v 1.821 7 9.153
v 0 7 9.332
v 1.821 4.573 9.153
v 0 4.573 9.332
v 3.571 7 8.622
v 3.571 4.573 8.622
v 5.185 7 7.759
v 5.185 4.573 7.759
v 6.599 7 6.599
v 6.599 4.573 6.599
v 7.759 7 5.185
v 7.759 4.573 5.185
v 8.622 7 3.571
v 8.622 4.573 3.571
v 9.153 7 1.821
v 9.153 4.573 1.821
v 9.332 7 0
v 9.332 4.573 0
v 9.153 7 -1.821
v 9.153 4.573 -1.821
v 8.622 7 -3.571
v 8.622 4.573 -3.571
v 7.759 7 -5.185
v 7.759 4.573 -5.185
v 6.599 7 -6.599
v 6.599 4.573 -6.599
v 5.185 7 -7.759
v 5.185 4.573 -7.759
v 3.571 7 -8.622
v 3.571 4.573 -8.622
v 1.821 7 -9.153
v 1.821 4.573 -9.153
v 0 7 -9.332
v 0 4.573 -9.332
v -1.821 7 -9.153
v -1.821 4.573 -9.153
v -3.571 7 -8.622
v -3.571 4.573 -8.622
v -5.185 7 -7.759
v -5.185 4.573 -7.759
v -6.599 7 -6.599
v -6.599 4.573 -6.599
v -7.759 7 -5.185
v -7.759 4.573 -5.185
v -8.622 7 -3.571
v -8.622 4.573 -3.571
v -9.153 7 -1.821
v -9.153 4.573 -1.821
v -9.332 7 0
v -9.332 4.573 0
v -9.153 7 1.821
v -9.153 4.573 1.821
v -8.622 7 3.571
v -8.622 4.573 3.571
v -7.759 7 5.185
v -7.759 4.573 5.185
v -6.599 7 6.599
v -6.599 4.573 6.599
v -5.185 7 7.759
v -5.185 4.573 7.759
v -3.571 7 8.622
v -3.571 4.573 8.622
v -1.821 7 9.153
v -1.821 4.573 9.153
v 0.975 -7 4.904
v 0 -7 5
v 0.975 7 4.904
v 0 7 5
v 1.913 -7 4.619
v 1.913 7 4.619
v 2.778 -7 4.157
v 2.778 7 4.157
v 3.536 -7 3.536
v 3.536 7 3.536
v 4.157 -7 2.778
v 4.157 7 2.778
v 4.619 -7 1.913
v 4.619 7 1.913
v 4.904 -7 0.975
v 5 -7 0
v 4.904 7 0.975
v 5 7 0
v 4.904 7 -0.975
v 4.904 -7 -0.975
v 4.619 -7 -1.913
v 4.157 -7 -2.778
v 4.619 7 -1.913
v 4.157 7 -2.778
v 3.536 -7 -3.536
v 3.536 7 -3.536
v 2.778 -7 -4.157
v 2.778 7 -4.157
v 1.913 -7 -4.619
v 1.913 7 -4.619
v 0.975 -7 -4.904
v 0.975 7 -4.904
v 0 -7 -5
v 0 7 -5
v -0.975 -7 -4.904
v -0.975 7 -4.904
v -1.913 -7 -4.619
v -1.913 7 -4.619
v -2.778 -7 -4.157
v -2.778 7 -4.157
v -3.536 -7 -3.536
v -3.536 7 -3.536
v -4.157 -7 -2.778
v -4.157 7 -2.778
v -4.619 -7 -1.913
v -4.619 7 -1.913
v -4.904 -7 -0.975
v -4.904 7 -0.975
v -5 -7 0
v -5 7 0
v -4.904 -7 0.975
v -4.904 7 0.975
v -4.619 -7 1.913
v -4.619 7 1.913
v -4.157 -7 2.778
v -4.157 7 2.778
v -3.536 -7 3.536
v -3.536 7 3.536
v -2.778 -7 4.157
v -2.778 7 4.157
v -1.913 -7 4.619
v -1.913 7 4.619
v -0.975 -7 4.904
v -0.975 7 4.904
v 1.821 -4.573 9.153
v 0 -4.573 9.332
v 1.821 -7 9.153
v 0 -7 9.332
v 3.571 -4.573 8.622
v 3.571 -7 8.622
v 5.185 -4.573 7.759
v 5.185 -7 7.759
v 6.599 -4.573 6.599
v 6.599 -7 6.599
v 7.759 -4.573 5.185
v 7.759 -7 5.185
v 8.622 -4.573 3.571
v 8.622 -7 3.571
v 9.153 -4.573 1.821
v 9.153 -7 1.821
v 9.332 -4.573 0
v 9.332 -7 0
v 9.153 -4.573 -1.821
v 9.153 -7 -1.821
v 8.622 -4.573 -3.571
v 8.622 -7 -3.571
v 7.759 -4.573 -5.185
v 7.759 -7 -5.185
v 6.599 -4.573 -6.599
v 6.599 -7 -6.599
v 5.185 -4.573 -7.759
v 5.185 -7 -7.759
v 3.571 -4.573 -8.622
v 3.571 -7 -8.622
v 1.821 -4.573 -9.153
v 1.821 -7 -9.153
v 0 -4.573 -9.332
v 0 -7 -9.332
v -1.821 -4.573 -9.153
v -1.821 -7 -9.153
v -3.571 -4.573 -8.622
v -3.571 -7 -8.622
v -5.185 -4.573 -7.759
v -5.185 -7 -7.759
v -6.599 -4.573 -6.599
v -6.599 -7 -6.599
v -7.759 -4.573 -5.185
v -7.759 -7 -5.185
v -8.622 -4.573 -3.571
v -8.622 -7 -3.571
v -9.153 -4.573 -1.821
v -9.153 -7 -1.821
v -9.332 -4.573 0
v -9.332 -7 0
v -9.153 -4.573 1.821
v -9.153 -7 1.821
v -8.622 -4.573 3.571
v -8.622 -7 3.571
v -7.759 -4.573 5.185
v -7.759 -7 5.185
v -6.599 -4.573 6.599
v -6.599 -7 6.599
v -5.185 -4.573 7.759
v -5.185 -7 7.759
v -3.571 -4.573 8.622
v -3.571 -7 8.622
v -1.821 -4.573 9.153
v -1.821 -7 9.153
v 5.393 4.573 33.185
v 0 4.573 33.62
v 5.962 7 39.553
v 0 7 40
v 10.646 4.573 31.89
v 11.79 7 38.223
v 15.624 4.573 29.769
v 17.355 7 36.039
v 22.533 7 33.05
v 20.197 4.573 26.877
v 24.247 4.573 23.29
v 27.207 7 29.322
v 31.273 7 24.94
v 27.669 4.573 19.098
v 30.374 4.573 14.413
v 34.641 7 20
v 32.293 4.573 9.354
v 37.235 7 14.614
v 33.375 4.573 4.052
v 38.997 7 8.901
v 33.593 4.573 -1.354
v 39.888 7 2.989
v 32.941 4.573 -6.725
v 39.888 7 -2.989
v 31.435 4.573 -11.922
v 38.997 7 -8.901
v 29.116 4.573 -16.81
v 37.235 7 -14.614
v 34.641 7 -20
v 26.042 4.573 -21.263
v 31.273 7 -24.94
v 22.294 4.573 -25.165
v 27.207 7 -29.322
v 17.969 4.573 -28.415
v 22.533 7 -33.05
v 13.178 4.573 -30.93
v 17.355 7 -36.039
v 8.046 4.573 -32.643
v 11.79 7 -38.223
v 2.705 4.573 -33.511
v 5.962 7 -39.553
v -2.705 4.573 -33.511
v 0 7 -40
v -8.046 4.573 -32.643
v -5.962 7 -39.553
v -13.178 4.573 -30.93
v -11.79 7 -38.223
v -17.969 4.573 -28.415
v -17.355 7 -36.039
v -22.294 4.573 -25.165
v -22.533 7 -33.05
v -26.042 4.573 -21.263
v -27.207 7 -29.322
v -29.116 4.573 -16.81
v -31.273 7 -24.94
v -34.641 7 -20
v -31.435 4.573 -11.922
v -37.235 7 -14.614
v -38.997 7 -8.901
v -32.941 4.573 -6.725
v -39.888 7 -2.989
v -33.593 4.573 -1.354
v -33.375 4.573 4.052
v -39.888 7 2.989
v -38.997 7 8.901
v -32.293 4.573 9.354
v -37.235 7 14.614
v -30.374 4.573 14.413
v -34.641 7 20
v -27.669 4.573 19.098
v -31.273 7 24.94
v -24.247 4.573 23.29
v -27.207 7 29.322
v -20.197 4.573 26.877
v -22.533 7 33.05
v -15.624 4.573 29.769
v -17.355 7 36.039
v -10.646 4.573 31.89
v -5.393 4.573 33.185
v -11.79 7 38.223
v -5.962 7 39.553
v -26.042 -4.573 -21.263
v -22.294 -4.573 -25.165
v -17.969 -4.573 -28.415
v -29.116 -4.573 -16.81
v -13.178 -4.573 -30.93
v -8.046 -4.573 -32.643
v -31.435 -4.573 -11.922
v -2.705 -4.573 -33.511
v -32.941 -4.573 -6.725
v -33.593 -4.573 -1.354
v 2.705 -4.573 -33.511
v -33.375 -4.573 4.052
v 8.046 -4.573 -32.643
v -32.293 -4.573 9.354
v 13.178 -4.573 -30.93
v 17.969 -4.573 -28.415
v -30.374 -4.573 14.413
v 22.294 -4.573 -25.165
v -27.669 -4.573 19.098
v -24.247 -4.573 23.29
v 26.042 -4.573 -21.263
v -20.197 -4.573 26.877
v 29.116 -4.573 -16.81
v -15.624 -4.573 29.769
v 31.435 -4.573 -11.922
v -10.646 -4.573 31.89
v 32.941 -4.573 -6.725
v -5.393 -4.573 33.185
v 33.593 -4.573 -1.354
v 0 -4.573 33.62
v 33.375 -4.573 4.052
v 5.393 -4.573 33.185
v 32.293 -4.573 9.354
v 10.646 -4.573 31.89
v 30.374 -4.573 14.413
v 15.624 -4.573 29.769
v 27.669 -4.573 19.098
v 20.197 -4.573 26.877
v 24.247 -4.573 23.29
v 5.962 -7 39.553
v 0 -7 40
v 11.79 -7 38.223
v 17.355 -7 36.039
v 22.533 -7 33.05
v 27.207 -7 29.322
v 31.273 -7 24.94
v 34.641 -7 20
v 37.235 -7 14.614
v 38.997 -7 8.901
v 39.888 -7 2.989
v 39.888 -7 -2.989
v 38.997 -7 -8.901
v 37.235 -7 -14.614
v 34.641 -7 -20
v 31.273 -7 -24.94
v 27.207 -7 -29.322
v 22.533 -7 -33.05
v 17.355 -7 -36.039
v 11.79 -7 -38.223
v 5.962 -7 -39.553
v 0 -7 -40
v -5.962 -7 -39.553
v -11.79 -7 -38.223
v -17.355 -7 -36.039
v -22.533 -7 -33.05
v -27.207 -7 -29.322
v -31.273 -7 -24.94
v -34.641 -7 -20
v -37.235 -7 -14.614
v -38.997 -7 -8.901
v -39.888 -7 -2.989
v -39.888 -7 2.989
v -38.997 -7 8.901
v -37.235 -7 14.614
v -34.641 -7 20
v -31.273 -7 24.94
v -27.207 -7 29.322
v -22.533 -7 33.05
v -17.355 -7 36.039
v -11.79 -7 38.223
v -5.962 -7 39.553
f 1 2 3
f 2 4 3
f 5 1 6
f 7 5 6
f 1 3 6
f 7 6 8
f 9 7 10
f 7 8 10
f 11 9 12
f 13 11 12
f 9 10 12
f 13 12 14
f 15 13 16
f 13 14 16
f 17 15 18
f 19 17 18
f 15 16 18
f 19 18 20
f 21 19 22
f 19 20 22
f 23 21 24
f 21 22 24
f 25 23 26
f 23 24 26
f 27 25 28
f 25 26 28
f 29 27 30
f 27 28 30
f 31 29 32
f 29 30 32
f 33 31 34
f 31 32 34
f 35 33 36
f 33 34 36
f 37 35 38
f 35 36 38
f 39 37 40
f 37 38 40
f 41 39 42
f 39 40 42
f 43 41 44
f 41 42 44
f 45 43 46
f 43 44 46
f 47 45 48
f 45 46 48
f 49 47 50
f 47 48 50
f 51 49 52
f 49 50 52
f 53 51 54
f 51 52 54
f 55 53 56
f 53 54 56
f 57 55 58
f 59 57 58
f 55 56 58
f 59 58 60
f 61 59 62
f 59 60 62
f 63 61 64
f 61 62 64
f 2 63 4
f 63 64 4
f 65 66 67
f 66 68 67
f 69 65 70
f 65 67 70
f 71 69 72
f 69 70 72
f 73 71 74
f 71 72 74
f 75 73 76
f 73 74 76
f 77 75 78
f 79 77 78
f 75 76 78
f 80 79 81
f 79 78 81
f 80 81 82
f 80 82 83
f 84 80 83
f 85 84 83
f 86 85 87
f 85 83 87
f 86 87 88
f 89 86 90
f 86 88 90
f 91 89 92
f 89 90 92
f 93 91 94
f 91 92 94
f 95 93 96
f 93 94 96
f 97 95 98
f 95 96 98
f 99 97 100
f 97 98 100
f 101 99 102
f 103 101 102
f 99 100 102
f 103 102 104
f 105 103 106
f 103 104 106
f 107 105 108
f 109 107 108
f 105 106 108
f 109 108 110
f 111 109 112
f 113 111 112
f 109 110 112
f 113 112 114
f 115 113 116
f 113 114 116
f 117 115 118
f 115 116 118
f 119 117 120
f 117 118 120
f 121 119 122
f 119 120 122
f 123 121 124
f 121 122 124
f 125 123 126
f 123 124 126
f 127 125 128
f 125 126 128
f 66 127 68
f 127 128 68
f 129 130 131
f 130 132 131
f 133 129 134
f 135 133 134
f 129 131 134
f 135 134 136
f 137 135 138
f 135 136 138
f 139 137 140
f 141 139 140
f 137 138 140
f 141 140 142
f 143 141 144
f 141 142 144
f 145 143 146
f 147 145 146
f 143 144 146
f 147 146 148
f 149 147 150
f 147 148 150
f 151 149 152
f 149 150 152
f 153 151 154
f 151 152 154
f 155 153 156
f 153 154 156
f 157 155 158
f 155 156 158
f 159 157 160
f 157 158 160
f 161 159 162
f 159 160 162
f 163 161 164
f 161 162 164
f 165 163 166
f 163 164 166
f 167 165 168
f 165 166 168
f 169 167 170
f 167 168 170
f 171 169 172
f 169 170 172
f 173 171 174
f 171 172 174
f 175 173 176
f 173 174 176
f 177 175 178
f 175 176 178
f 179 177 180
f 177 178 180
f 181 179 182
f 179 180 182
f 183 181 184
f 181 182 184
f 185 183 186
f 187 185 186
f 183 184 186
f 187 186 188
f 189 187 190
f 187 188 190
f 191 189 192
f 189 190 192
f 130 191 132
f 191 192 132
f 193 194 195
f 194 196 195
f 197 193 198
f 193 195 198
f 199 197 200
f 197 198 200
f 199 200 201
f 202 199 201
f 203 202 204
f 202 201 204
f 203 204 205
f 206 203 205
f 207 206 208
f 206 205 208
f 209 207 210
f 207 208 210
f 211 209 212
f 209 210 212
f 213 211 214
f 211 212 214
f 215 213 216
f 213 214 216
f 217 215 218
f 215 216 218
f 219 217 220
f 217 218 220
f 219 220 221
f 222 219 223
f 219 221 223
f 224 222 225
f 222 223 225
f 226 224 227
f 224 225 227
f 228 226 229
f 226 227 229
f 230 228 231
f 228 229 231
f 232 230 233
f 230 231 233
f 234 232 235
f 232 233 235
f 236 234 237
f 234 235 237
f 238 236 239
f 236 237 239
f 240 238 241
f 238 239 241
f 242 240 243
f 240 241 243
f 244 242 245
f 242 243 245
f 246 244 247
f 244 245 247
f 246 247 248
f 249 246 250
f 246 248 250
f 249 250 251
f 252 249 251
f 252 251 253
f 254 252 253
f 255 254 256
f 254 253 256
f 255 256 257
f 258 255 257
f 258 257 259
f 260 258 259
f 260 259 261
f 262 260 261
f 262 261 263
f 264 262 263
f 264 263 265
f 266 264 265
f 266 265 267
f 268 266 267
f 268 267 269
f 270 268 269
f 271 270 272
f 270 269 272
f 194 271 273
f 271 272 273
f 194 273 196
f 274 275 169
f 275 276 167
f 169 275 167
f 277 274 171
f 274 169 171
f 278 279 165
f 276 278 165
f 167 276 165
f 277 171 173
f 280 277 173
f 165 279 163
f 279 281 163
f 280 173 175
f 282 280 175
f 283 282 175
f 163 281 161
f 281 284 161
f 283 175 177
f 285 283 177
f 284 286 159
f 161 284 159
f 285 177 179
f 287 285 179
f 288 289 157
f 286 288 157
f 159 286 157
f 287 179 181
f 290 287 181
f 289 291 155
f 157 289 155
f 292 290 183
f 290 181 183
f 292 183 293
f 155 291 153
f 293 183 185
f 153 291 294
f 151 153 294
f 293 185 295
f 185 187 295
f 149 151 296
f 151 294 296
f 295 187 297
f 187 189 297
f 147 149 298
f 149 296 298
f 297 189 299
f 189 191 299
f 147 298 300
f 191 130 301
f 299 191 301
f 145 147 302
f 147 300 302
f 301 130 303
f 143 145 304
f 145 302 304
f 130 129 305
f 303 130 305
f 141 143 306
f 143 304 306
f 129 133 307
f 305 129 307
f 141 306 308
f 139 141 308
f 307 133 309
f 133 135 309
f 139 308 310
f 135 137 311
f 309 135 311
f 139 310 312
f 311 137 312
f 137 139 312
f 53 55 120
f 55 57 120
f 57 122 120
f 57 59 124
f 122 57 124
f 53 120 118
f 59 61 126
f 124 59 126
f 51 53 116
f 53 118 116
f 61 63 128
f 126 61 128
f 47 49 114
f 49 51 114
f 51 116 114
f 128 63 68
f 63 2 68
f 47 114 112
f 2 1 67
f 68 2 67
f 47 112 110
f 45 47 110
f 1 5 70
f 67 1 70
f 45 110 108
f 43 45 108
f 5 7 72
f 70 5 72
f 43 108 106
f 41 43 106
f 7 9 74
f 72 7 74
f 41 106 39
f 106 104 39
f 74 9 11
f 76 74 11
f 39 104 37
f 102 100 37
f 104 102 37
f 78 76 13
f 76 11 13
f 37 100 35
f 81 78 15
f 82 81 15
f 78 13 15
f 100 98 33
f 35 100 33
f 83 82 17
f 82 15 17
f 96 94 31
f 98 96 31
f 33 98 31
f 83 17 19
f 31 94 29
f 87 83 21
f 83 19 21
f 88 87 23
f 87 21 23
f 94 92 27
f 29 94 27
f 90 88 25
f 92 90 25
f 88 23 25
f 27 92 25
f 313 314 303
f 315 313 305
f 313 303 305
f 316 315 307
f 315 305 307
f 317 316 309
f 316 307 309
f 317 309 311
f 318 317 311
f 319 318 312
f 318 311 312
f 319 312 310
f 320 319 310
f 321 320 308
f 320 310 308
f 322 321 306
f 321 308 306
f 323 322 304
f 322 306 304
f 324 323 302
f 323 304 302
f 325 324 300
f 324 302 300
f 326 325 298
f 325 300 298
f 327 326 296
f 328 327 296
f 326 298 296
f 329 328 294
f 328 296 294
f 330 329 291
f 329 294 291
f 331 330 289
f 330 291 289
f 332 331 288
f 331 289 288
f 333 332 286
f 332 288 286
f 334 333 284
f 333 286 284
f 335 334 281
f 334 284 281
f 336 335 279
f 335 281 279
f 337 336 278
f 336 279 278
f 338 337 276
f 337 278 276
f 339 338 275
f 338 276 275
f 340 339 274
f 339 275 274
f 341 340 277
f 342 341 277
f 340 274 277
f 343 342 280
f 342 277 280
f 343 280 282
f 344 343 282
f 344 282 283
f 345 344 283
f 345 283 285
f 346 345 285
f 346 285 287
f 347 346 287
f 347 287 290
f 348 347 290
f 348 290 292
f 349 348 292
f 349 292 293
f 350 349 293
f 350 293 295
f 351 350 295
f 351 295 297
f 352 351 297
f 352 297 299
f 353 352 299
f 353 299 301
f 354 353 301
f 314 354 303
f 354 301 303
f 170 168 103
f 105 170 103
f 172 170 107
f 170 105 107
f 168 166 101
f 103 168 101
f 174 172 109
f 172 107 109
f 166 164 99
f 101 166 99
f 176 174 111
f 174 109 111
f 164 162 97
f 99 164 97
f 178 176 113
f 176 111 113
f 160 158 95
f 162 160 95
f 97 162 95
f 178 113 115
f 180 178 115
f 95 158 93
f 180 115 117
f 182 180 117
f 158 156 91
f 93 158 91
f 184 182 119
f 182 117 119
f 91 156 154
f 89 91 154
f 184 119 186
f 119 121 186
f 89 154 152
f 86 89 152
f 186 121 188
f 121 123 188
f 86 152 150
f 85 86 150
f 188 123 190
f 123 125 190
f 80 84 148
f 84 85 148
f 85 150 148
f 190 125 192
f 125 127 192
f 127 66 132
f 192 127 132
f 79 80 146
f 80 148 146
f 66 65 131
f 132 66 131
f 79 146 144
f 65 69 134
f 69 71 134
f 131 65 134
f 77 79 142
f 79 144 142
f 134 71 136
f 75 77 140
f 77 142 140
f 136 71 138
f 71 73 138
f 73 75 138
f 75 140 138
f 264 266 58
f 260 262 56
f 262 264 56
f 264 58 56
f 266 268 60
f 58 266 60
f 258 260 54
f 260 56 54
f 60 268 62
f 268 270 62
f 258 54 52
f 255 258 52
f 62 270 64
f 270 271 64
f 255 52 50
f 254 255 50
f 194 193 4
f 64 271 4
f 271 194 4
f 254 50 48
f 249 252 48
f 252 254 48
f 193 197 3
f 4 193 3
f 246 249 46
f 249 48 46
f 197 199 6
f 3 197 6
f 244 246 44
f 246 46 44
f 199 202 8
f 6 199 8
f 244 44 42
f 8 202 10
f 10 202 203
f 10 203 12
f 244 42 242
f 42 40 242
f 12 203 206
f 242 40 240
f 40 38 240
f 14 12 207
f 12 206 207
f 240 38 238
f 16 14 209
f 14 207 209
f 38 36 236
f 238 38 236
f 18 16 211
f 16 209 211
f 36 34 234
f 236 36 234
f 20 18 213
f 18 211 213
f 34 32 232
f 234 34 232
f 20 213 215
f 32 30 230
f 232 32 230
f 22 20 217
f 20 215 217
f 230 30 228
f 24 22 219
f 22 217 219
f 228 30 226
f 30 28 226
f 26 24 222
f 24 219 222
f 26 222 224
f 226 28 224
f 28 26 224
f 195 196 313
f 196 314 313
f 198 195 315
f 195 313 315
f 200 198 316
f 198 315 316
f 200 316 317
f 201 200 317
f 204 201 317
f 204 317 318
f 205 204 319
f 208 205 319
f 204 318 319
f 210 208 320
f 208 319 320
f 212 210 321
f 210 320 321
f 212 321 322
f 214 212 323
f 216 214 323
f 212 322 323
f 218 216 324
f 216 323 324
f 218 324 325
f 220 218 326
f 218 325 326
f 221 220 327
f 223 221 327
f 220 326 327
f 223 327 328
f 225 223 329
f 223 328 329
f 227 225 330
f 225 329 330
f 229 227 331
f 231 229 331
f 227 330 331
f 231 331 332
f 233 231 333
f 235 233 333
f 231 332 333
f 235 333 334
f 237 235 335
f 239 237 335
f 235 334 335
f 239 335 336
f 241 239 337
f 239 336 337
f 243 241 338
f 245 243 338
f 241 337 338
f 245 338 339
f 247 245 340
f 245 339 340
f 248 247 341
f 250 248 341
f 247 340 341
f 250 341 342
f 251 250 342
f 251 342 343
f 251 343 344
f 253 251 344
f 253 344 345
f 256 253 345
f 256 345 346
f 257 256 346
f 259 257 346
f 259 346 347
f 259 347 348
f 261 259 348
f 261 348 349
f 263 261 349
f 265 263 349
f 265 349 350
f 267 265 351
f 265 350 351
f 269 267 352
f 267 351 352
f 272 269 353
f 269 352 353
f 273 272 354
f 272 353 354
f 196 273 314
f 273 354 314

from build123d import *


with BuildPart() as part:
    # Sketch → Revolution (revolve)
    with BuildSketch(Plane.YZ):
        Polygon((7, 40), (-7, 40), (-4.57259, 33.620199), (-4.57259, 9.331906), (-7, 9.331906), (-7, 5), (7, 5), (7, 9.331906), (4.57259, 9.331906), (4.57259, 33.620199), align=None)
    revolve(axis=Axis((0, 0, 0), (0, 1, 0)))


solid = part.part
